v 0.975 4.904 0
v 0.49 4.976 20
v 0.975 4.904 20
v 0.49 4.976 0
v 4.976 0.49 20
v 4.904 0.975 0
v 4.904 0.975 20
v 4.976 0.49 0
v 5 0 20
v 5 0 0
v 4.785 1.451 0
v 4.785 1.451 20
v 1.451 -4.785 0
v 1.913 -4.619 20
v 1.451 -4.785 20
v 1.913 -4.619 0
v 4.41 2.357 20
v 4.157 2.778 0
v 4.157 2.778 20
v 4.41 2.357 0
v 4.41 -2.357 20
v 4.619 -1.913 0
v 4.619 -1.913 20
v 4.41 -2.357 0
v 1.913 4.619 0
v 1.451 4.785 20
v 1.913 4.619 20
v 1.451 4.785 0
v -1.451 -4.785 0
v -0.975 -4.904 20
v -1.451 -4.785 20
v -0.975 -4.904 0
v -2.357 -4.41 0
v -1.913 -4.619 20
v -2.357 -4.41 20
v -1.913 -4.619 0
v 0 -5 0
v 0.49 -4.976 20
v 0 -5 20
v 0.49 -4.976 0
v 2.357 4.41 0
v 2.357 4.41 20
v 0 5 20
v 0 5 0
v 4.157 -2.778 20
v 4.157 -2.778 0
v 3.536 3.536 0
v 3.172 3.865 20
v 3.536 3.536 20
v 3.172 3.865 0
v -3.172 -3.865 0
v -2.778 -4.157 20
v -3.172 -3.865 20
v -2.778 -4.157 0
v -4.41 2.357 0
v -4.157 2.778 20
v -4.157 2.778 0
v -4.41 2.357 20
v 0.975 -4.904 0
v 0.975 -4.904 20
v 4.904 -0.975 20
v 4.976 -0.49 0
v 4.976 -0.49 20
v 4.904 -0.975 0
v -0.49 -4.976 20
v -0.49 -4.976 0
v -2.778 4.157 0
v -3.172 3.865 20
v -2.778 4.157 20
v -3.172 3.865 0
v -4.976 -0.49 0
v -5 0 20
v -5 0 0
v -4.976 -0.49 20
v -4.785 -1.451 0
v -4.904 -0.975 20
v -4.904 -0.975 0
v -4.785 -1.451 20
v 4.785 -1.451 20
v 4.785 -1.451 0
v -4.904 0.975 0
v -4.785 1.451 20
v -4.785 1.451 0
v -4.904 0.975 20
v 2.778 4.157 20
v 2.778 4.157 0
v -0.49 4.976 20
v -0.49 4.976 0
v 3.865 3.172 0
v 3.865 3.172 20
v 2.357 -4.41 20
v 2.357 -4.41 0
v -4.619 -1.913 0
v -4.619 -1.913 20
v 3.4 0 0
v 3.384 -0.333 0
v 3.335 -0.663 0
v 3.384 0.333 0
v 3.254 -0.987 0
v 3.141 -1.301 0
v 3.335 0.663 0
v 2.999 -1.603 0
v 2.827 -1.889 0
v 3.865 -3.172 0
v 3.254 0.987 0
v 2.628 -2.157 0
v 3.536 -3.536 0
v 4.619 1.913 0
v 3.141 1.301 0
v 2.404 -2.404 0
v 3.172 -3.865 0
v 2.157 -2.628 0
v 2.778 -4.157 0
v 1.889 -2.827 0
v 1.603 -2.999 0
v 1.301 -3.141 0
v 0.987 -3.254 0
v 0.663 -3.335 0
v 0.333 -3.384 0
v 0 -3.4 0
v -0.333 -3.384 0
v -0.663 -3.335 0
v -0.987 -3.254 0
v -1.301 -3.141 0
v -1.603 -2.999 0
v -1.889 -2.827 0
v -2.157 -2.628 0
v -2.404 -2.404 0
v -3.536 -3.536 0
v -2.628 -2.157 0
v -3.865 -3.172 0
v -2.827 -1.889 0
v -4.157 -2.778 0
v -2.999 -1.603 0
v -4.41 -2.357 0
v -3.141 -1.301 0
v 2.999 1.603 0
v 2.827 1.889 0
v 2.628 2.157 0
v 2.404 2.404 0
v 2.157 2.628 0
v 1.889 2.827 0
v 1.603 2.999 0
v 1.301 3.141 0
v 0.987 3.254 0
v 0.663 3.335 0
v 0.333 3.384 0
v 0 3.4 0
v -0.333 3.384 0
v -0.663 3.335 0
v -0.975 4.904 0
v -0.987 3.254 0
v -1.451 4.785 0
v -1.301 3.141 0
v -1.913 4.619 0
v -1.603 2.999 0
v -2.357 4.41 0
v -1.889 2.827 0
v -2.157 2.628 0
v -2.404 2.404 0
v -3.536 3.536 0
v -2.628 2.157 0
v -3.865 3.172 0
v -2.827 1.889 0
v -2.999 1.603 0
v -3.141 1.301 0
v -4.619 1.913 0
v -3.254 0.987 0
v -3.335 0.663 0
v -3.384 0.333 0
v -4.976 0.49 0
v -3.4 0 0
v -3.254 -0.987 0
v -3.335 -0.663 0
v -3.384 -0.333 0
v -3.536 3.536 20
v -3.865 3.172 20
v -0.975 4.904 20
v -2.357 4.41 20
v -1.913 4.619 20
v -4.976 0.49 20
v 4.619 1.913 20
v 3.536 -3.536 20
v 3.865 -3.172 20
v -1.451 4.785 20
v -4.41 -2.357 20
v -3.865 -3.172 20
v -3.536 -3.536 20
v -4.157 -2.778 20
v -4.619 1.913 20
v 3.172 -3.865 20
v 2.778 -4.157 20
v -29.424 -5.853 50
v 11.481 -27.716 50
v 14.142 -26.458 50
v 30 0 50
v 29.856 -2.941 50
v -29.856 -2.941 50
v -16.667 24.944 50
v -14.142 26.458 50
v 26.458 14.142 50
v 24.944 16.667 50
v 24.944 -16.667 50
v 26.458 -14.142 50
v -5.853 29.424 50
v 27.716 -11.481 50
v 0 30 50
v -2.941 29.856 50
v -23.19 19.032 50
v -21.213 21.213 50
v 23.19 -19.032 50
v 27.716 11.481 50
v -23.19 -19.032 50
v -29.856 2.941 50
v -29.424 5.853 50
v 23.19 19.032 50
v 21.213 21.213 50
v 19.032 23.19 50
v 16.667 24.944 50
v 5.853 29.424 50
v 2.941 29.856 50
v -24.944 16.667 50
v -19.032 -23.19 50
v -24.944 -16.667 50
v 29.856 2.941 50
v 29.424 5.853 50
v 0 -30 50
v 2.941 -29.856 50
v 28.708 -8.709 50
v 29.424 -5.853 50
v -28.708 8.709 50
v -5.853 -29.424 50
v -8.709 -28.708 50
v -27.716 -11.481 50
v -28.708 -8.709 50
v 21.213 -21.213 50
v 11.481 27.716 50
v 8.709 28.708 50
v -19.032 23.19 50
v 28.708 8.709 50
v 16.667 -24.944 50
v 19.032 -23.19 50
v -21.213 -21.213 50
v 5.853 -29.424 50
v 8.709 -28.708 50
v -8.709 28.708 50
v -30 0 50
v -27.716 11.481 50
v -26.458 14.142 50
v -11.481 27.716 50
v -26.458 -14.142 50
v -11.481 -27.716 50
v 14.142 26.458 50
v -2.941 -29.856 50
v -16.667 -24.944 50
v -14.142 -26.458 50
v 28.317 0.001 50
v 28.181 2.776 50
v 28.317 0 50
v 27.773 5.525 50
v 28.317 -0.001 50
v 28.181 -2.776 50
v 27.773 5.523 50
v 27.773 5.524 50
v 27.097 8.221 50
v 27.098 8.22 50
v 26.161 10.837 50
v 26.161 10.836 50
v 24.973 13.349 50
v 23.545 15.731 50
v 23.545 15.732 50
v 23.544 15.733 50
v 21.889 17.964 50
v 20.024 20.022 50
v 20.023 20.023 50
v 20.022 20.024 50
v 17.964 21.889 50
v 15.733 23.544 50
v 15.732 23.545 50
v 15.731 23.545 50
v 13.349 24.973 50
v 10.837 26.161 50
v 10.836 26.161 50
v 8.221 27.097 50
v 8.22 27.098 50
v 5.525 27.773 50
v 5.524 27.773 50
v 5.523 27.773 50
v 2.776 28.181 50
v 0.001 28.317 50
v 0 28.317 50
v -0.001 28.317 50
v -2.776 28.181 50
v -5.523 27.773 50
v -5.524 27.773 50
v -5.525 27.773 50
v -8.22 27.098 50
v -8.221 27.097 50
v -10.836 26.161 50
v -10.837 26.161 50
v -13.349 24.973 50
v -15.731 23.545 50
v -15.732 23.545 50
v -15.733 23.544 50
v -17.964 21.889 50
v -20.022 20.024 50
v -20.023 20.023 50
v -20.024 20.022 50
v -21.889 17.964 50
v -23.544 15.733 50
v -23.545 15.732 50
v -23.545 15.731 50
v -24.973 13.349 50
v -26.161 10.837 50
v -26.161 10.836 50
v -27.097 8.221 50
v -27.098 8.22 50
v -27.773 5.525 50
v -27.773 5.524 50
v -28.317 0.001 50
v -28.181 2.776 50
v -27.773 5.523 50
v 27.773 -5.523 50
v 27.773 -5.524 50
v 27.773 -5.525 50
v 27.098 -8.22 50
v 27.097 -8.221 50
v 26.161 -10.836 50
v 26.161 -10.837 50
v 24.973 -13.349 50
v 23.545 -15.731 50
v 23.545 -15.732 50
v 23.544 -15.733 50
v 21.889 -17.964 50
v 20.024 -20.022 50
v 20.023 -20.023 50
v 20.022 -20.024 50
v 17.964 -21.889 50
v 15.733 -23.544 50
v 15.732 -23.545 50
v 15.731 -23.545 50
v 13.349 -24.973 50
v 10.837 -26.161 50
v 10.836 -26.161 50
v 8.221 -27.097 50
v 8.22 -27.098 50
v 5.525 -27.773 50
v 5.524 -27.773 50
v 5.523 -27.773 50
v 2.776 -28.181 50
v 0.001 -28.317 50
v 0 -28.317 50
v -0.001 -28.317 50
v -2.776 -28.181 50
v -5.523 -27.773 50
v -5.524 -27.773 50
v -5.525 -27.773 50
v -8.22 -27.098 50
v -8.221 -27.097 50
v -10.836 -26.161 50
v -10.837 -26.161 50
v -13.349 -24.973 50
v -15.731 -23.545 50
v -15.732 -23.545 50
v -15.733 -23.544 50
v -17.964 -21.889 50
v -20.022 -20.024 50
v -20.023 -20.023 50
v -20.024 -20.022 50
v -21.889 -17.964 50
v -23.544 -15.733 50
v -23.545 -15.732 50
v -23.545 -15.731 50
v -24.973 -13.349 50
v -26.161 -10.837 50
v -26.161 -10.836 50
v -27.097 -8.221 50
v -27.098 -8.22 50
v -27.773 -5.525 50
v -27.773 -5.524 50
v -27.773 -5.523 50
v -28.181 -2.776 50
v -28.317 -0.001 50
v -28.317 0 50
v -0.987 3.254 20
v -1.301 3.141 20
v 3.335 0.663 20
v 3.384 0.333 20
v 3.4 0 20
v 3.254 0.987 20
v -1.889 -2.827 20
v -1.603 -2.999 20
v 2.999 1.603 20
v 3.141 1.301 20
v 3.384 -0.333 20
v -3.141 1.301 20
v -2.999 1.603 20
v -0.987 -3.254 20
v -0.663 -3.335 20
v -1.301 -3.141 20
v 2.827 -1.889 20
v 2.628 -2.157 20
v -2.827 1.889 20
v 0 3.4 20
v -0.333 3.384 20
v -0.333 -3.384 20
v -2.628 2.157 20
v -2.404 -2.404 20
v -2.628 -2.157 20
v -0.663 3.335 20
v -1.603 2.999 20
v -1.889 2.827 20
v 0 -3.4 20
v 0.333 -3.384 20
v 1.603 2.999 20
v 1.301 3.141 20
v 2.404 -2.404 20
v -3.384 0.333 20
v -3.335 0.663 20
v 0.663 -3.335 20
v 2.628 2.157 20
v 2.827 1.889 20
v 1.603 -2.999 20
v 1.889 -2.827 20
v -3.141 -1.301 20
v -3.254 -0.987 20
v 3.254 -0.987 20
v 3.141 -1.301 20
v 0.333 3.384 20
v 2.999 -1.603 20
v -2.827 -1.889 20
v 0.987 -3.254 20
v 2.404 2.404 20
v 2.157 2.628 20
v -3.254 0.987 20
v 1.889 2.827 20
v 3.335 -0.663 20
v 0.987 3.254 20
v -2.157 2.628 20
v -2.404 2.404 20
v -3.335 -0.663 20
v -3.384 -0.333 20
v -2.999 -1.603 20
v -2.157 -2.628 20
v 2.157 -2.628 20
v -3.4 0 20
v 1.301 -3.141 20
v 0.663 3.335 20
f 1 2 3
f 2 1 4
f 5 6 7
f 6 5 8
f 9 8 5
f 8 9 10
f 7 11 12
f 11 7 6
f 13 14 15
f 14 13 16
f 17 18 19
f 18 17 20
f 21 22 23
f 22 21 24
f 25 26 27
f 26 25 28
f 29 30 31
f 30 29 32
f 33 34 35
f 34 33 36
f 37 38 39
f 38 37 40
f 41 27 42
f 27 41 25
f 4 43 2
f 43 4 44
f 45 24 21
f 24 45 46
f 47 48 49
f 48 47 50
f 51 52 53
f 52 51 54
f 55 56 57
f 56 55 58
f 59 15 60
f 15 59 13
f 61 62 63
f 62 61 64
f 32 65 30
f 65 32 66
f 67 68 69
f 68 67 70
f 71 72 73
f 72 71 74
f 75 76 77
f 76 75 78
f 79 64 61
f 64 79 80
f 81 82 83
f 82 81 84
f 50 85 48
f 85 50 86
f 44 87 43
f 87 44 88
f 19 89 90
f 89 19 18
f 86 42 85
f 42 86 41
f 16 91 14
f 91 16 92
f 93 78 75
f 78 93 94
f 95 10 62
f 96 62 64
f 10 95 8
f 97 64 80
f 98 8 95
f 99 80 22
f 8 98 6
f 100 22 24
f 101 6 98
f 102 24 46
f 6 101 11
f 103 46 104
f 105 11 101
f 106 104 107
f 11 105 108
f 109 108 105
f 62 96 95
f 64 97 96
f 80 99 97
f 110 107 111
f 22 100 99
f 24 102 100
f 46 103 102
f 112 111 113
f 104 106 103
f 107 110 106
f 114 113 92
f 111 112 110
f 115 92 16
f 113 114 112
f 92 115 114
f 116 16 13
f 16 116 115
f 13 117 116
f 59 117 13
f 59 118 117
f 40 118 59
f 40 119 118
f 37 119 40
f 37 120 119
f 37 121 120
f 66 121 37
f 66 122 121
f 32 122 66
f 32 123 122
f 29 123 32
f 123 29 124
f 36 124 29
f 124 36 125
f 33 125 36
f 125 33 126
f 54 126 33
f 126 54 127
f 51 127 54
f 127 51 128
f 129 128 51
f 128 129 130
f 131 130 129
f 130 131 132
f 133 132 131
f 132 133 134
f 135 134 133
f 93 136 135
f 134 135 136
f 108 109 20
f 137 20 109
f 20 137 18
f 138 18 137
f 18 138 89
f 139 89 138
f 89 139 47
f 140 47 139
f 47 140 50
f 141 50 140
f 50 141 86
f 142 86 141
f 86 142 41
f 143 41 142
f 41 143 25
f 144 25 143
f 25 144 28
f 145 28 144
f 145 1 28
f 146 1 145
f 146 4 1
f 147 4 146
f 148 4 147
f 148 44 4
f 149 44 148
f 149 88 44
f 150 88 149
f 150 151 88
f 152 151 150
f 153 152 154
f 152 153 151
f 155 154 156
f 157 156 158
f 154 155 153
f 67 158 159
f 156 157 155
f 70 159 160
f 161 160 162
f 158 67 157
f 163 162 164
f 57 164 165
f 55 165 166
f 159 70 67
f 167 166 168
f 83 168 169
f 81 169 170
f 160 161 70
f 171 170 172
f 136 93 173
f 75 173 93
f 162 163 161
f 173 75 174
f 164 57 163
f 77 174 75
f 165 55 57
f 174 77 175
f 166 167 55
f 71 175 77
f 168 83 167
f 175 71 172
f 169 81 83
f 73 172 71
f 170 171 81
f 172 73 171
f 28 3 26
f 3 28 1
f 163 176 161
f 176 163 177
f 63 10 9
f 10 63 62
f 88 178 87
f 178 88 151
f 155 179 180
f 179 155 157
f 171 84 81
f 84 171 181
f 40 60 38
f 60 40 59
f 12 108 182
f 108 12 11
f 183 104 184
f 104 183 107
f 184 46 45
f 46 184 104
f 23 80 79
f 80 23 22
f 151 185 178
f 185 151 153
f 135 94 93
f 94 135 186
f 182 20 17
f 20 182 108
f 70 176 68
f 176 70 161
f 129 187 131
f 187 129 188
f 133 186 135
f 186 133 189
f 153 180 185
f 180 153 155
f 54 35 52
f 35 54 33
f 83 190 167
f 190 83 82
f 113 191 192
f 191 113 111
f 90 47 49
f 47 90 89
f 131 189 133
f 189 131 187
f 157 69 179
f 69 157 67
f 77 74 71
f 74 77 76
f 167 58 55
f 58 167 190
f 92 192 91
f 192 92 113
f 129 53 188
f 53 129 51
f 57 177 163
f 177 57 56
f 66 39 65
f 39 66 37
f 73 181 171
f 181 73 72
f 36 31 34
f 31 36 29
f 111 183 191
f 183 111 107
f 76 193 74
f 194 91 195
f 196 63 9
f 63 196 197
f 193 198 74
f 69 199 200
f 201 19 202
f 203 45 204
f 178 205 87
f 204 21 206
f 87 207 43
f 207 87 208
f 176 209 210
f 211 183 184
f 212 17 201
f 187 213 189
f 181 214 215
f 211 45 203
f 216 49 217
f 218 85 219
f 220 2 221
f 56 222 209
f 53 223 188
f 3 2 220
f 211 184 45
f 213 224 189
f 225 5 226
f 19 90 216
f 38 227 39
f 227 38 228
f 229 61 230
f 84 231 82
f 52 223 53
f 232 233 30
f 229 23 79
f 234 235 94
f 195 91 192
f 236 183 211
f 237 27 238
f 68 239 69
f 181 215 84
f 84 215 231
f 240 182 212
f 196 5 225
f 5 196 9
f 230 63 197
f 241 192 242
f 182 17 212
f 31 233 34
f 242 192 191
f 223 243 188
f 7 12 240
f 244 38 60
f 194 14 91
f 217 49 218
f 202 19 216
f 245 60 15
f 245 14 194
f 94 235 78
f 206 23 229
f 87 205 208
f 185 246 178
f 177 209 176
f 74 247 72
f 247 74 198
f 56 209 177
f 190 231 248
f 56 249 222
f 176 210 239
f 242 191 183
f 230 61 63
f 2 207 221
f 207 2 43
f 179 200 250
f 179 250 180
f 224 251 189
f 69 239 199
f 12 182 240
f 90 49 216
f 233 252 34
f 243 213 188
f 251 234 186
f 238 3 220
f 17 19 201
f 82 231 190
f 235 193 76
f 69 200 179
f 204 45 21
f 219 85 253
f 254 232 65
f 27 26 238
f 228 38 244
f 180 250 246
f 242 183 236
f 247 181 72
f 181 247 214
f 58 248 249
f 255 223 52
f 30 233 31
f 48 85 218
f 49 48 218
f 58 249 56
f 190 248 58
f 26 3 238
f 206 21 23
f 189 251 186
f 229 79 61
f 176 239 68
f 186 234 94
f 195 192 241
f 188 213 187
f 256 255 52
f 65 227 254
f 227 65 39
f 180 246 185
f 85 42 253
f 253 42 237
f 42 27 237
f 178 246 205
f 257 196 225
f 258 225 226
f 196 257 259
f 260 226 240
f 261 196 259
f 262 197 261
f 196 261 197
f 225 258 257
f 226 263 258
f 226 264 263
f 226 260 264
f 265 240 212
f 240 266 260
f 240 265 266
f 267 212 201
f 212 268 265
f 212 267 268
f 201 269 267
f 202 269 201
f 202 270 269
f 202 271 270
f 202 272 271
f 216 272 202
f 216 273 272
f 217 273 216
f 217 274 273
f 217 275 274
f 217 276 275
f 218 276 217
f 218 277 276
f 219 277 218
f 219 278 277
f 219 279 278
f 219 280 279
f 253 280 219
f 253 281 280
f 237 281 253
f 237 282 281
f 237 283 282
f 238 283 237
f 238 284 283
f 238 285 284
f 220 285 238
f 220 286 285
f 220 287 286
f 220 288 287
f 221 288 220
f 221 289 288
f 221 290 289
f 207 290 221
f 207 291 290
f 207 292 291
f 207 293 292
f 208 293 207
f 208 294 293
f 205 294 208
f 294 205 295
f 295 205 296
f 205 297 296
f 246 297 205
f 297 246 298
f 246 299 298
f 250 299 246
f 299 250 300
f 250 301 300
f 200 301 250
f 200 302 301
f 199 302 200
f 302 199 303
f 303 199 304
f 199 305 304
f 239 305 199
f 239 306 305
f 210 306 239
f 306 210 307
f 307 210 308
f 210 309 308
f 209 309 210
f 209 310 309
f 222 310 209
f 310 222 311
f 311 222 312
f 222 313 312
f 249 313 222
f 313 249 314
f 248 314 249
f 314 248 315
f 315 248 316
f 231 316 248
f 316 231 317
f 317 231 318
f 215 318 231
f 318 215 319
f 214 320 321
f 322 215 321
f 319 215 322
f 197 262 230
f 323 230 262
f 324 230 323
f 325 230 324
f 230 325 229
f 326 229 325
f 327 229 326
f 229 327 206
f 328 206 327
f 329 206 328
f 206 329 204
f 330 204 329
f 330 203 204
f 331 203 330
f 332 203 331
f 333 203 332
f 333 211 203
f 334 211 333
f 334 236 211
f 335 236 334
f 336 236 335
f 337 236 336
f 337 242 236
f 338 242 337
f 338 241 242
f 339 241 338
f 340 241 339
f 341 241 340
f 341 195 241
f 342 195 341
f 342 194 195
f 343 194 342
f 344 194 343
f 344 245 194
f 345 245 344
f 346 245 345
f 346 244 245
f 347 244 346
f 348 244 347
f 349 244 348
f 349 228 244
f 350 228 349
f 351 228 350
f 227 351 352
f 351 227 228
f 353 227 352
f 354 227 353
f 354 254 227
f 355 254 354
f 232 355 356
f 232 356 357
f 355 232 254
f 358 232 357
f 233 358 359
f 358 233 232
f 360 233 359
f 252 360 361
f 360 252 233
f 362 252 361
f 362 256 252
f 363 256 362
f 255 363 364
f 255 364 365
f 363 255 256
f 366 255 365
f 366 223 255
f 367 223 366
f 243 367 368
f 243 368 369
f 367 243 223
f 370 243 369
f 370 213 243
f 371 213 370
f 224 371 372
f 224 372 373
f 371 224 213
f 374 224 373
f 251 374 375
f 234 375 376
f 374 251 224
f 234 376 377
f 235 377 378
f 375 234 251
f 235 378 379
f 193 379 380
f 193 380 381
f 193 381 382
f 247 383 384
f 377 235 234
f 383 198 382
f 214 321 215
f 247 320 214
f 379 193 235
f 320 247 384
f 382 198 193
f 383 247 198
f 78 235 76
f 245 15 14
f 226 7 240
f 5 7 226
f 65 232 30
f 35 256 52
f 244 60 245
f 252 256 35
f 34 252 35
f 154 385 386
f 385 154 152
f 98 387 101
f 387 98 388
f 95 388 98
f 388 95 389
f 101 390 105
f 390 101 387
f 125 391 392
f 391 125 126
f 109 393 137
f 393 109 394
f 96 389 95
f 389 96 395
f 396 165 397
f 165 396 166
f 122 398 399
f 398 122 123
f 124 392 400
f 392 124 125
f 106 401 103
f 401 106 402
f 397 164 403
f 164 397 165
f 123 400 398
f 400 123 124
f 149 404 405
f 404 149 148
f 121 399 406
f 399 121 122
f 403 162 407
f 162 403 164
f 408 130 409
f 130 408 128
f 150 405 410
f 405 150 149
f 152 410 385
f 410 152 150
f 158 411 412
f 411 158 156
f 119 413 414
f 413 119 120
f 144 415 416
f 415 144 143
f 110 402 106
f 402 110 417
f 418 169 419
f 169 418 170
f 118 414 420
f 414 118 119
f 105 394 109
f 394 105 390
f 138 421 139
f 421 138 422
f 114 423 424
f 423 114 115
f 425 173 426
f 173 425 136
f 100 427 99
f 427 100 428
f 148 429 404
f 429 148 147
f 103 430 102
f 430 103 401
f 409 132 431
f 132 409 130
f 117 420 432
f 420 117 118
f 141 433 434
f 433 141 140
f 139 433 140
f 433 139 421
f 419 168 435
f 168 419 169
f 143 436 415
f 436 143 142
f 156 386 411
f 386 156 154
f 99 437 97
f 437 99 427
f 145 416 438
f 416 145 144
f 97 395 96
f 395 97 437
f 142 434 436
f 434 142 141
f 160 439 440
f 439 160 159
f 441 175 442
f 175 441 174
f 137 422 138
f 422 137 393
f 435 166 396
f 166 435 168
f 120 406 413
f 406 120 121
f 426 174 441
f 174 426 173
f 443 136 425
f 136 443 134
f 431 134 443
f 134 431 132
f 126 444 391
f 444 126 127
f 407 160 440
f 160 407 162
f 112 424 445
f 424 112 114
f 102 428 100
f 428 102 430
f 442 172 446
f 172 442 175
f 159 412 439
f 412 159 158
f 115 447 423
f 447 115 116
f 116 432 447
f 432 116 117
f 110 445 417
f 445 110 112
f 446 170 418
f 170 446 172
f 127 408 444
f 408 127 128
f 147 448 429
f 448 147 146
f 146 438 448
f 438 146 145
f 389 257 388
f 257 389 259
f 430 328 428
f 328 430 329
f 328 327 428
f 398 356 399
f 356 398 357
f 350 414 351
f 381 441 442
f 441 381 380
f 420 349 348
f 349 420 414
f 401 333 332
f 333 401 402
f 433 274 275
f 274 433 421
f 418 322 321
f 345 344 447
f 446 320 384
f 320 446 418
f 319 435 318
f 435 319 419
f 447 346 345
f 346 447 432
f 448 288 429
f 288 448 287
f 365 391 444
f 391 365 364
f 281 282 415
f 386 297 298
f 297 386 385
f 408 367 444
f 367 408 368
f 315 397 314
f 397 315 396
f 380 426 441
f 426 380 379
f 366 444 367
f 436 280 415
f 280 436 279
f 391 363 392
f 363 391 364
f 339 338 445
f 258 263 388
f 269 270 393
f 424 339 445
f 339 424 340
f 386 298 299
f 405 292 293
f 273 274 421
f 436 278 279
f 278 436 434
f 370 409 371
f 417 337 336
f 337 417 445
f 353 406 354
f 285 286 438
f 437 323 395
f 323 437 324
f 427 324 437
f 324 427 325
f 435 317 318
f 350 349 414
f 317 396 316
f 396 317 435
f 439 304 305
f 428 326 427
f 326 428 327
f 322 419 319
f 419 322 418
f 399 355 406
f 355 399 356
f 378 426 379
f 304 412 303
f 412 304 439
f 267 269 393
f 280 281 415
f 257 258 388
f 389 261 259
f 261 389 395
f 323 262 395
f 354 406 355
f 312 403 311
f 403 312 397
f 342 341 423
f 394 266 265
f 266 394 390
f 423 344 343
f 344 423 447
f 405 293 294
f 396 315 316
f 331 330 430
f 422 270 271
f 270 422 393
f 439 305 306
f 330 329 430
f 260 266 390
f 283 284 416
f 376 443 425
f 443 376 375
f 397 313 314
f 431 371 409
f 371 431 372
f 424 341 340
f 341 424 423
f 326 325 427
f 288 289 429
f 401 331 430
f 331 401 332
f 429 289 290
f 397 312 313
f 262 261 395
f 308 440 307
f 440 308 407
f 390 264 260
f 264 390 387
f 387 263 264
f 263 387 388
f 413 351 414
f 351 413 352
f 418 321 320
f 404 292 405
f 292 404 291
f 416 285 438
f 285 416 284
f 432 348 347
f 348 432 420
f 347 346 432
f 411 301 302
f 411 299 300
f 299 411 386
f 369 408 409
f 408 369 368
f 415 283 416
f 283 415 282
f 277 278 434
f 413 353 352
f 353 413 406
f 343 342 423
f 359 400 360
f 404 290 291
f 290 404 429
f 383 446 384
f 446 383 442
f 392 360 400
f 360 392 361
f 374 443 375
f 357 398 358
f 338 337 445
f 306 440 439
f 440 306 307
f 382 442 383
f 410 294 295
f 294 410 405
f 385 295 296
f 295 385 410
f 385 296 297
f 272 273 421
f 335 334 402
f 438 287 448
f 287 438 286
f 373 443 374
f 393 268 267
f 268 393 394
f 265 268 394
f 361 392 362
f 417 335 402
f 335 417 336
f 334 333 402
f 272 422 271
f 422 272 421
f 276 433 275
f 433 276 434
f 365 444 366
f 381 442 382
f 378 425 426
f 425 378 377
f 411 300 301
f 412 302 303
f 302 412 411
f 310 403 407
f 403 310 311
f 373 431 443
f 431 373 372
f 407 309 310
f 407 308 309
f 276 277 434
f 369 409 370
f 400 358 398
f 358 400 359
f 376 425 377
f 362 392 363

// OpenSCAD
// Small laboratory funnel for liquid transfer
// Stands upright with wide mouth on top
// Open at both ends for direct flow

// Dimensions (mm)
outer_tube_diameter = 10;        // outer diameter of narrow section
outer_cone_top_diameter = 10;    // outer diameter where cone starts
outer_cone_bottom_diameter = 60; // outer diameter at wide opening (top)
tube_height = 20;                // height of narrow cylindrical section
cone_height = 30;                // height of conical section
wall_thickness = 1.6;            // wall thickness (constant throughout)

// Calculated values
outer_tube_r = outer_tube_diameter / 2;
outer_cone_top_r = outer_cone_top_diameter / 2;
outer_cone_bottom_r = outer_cone_bottom_diameter / 2;
inner_tube_r = outer_tube_r - wall_thickness;
inner_cone_top_r = outer_cone_top_r - wall_thickness;
inner_cone_bottom_r = outer_cone_bottom_r - wall_thickness;

$fn = 64;

// Create the funnel
difference() {
    // Outer surfaces
    union() {
        // Cylindrical tube (z=0 to z=20)
        cylinder(h = tube_height, r = outer_tube_r, center = false);
        // Conical funnel (z=20 to z=50)
        translate([0, 0, tube_height])
            cylinder(h = cone_height, r1 = outer_cone_top_r, r2 = outer_cone_bottom_r, center = false);
    }
    
    // Inner cavity (to be subtracted)
    union() {
        // Cylindrical cavity in tube section
        cylinder(h = tube_height + 0.1, r = inner_tube_r, center = false);
        // Conical cavity in funnel section
        translate([0, 0, tube_height])
            cylinder(h = cone_height + 0.1, r1 = inner_cone_top_r, r2 = inner_cone_bottom_r, center = false);
    }
}
